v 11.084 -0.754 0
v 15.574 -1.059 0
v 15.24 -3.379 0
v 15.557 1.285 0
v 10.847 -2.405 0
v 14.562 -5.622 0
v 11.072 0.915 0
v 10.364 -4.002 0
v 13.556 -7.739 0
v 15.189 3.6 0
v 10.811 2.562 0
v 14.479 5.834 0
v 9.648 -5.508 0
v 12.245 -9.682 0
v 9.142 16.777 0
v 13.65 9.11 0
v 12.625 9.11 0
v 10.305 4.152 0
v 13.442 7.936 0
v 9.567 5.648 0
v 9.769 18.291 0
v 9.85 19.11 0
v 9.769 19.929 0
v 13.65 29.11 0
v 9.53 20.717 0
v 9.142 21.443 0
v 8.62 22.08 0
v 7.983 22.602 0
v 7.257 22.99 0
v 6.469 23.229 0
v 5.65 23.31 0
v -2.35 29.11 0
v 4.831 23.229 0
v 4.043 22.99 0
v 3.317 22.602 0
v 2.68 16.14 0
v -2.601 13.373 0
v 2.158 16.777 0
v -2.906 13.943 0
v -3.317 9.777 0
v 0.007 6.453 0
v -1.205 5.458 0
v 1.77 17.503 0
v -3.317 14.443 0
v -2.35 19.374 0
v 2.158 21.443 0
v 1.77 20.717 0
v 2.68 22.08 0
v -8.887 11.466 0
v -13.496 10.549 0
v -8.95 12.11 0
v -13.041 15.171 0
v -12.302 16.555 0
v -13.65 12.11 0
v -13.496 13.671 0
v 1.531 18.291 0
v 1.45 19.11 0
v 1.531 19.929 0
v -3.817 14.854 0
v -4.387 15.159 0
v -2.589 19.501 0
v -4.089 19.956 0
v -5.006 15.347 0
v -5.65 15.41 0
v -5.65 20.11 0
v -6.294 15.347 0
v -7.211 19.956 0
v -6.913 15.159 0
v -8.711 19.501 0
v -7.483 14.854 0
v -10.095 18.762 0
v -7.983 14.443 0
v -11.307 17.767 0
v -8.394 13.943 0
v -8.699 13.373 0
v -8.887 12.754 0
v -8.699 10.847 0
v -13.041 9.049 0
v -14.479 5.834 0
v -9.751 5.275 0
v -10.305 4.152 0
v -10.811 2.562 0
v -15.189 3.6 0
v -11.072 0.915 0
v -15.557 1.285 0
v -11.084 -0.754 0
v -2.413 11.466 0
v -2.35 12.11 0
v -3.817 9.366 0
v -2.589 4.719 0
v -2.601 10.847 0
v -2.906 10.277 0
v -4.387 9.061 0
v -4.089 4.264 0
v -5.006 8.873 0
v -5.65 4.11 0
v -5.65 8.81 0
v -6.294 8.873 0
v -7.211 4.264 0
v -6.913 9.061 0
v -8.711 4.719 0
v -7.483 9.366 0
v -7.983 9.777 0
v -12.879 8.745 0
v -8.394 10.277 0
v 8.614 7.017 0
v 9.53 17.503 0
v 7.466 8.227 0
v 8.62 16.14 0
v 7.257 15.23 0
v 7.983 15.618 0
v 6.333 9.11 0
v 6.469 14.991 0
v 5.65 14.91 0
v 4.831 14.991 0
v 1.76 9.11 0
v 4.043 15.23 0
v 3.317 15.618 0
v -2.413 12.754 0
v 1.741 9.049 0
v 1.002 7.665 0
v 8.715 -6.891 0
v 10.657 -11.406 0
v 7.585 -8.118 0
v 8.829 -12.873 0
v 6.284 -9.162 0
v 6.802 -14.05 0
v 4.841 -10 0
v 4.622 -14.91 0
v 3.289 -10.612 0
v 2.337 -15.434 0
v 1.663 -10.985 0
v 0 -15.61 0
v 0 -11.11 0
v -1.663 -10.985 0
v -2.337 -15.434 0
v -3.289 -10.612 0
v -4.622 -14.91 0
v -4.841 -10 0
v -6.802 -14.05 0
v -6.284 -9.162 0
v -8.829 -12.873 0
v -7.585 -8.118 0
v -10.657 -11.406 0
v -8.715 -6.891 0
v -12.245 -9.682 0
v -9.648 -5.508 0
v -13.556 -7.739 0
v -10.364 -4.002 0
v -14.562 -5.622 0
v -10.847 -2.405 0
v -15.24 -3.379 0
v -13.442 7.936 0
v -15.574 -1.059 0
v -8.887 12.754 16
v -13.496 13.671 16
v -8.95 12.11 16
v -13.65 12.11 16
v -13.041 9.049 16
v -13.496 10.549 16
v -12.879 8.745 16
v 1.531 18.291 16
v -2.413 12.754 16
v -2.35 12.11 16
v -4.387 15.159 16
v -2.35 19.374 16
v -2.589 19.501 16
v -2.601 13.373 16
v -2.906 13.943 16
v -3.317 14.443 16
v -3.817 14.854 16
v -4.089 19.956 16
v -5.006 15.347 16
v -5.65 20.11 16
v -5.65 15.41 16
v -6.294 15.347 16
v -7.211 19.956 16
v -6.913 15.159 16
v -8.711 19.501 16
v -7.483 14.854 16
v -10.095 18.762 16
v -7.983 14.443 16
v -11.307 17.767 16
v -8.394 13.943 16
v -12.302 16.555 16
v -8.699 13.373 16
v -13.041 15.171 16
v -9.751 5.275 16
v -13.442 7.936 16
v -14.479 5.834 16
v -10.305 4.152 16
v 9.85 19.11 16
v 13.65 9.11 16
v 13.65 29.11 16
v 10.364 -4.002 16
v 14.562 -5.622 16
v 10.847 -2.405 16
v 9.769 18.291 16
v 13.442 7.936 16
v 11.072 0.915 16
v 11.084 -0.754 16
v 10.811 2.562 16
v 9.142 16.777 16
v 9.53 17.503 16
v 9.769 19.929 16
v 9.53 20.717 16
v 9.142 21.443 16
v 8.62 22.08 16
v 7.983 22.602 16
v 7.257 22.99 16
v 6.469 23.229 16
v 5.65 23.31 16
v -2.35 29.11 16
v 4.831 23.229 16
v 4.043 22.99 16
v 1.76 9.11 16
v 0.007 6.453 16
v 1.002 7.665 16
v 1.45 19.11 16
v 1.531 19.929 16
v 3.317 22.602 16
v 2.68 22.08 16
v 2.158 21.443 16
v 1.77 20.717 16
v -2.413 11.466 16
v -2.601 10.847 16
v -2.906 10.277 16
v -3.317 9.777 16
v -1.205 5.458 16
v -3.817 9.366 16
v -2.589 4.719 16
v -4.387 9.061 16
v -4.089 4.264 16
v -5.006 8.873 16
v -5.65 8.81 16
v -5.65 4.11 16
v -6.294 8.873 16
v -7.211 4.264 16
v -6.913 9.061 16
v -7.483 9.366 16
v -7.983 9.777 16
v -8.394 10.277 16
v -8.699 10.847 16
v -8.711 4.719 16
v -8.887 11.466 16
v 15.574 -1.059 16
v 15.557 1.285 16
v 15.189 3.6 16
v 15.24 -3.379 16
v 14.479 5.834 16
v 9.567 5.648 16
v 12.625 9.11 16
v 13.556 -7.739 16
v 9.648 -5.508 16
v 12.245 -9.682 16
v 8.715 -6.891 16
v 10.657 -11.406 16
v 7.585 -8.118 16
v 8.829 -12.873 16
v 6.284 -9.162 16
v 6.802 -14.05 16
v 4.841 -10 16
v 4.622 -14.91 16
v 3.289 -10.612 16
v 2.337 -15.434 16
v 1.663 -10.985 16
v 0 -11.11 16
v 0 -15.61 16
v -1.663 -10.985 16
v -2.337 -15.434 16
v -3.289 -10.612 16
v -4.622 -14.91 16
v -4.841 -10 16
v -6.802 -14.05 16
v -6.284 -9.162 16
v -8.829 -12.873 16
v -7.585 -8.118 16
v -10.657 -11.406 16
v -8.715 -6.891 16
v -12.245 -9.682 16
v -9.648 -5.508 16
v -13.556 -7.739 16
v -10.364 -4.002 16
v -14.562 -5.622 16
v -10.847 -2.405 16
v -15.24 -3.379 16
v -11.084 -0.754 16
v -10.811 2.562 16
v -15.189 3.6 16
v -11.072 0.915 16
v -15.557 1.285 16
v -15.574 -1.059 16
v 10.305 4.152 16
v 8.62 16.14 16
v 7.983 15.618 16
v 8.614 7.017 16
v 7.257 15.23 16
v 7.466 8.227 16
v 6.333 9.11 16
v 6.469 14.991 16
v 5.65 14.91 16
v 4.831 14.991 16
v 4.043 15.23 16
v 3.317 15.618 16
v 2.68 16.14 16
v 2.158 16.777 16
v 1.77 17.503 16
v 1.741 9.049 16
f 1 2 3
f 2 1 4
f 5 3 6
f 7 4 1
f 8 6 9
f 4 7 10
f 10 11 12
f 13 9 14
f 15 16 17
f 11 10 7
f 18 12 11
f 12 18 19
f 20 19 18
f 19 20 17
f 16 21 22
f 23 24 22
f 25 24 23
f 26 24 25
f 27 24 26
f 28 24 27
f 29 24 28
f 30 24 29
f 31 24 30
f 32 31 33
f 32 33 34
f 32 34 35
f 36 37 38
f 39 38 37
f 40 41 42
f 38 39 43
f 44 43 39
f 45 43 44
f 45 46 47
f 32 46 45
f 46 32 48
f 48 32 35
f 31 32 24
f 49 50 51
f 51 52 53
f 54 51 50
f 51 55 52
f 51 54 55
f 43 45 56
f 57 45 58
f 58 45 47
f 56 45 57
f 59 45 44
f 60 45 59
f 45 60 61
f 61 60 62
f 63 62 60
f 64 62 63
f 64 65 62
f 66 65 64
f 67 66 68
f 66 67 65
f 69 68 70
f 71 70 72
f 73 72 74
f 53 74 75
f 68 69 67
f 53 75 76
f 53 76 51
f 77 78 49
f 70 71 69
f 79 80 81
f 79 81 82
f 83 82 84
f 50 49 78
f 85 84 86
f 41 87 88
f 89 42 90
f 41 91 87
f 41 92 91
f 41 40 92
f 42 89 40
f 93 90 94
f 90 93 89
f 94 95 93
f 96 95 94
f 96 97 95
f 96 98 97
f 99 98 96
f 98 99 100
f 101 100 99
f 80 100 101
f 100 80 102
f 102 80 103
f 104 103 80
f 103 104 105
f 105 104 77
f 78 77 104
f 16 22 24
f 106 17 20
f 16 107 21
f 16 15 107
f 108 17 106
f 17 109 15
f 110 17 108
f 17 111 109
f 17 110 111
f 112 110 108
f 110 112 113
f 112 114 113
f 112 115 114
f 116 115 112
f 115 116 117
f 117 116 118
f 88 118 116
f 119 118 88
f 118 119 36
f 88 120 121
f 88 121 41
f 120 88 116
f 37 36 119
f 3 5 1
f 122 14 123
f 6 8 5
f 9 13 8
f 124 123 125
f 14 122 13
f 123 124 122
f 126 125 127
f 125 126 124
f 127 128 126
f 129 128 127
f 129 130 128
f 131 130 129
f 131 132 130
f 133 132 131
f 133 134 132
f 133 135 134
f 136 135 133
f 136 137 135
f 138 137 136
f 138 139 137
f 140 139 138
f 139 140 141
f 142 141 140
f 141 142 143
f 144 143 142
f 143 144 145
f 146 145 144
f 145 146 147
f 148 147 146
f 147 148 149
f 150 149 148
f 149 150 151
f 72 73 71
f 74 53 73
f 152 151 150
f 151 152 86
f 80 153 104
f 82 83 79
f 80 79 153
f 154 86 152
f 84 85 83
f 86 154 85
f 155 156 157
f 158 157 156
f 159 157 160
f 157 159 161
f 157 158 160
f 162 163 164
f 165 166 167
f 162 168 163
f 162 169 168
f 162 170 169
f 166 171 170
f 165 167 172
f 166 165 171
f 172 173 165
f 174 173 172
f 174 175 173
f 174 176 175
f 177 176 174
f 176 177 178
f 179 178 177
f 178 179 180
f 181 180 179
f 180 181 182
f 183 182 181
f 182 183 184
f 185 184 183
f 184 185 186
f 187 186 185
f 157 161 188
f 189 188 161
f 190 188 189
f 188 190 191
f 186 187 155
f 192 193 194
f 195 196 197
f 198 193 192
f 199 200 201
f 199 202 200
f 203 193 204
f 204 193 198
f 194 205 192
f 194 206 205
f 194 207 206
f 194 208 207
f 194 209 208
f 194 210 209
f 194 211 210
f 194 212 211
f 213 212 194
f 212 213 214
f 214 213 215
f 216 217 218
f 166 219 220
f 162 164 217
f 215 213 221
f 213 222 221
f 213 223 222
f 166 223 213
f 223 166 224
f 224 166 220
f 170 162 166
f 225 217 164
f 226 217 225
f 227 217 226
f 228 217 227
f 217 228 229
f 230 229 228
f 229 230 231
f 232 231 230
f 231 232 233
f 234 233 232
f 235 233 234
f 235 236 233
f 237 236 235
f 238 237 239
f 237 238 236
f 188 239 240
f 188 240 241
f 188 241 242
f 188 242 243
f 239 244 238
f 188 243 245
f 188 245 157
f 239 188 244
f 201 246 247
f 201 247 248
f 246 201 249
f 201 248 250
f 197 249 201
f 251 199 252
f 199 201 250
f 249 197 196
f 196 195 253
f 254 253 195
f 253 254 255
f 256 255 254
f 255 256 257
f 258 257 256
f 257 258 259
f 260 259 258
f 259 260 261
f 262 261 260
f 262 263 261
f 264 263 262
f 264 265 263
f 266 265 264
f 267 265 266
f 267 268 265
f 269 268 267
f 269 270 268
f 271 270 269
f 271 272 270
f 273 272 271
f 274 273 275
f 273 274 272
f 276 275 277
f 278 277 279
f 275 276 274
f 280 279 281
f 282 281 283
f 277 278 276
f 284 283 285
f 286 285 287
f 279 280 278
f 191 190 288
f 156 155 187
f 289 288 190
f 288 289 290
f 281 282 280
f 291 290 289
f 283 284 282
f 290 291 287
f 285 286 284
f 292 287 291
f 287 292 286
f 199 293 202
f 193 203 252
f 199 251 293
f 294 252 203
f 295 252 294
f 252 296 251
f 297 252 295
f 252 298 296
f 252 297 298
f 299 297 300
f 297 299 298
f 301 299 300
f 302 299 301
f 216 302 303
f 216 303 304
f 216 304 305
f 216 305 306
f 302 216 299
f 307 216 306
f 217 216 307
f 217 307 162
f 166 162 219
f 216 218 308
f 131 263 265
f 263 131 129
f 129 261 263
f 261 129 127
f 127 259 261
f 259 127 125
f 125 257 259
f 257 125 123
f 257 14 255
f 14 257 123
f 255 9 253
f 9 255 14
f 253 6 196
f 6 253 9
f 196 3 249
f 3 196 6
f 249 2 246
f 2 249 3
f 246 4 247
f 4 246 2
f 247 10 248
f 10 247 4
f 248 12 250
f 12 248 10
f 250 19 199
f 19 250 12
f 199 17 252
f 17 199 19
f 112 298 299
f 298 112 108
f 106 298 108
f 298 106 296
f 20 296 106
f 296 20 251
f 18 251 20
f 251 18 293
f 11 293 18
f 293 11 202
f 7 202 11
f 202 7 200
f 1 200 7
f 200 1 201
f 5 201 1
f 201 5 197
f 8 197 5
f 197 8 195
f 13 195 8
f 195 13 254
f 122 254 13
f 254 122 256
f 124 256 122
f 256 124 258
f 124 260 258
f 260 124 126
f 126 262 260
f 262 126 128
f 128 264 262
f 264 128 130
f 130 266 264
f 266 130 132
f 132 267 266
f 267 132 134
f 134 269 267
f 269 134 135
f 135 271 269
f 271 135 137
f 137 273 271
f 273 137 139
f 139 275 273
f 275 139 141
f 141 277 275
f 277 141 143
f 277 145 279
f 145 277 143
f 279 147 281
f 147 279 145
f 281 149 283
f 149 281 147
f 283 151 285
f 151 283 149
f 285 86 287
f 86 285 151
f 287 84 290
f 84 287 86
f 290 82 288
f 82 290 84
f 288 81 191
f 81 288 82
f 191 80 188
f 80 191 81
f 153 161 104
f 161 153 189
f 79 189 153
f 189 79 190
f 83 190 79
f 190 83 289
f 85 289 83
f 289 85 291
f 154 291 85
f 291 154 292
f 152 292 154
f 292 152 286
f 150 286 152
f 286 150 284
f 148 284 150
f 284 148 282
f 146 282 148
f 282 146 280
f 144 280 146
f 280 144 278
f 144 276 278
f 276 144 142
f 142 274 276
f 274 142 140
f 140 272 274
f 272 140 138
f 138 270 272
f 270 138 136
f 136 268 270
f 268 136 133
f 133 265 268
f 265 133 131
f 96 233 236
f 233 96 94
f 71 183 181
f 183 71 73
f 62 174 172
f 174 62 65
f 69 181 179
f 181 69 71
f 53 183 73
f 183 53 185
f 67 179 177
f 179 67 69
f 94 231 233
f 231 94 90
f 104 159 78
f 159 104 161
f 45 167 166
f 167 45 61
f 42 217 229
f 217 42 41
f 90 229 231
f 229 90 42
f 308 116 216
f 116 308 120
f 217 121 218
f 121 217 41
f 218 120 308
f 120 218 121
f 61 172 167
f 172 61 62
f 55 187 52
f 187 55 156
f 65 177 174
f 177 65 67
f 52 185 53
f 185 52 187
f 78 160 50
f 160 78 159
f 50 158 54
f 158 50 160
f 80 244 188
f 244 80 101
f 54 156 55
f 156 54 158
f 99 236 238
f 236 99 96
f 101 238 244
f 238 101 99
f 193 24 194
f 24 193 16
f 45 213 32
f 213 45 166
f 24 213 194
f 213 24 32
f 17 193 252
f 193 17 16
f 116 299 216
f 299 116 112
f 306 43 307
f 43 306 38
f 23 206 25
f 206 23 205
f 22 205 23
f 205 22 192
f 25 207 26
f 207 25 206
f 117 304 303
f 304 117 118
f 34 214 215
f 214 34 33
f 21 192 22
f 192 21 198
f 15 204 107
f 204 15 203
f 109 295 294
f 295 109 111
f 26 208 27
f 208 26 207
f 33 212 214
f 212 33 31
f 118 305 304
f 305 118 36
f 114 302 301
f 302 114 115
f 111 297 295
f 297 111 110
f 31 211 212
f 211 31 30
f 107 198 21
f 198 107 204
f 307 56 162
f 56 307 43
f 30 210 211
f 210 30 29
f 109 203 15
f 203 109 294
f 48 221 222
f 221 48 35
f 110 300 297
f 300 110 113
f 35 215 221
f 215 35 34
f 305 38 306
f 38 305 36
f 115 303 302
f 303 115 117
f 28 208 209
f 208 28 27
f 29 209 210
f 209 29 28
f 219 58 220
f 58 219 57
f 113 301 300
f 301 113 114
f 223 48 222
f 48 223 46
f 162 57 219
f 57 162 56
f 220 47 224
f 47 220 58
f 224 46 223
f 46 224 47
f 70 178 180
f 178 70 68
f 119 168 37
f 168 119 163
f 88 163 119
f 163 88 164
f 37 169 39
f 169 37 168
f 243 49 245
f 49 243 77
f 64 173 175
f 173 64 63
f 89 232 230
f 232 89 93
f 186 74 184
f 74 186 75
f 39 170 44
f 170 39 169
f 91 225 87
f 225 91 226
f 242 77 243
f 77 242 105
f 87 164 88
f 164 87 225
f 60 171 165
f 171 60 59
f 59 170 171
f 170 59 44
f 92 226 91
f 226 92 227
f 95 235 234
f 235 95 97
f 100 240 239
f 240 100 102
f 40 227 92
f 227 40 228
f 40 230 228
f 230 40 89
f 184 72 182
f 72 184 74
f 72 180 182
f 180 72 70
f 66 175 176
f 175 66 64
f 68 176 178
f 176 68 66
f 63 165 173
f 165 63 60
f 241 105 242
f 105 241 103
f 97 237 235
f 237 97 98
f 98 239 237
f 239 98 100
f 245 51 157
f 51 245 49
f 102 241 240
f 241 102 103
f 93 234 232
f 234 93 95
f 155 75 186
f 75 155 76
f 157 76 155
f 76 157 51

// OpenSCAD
$fn = 32;

// ----------------------------------------------------------------------
// Pipe clamp: 31.22 mm ring, 4.5 mm wall, 16 mm wide
// ----------------------------------------------------------------------

// --- parameters (mm) ---
outer_r = 15.61;          // clamp outside radius
inner_r = 11.11;          // pipe bore radius
band = 4.5;               // band thickness
clamp_w = 16;             // clamp width
opening = 50;             // opening angle between the ends
lug_w = 16;               // lug width
lug_len = 20;             // lug length
bolt_d = 8.4;             // bolt hole
knuckle_d = 16;           // hinge knuckle diameter
pin_d = 6.6;              // hinge pin hole

clamp_profile = [[-6.597, 14.147], [-8.641, 13], [-10.49, 11.56], [-12.103, 9.859], [-13.442, 7.936], [-14.479, 5.834], [-15.189, 3.6], [-15.557, 1.285], [-15.574, -1.059], [-15.24, -3.379], [-14.562, -5.622], [-13.556, -7.739], [-12.245, -9.682], [-10.657, -11.406], [-8.829, -12.873], [-6.802, -14.05], [-4.622, -14.91], [-2.337, -15.434], [0, -15.61], [2.337, -15.434], [4.622, -14.91], [6.802, -14.05], [8.829, -12.873], [10.657, -11.406], [12.245, -9.682], [13.556, -7.739], [14.562, -5.622], [15.24, -3.379], [15.574, -1.059], [15.557, 1.285], [15.189, 3.6], [14.479, 5.834], [13.442, 7.936], [12.103, 9.859], [10.49, 11.56], [8.641, 13], [6.597, 14.147], [4.695, 10.069], [6.15, 9.253], [7.466, 8.227], [8.614, 7.017], [9.567, 5.648], [10.305, 4.152], [10.811, 2.562], [11.072, 0.915], [11.084, -0.754], [10.847, -2.405], [10.364, -4.002], [9.648, -5.508], [8.715, -6.891], [7.585, -8.118], [6.284, -9.162], [4.841, -10], [3.289, -10.612], [1.663, -10.985], [0, -11.11], [-1.663, -10.985], [-3.289, -10.612], [-4.841, -10], [-6.284, -9.162], [-7.585, -8.118], [-8.715, -6.891], [-9.648, -5.508], [-10.364, -4.002], [-10.847, -2.405], [-11.084, -0.754], [-11.072, 0.915], [-10.811, 2.562], [-10.305, 4.152], [-9.567, 5.648], [-8.614, 7.017], [-7.466, 8.227], [-6.15, 9.253], [-4.695, 10.069]];

difference() {
  union() {
    linear_extrude(height = clamp_w) polygon(clamp_profile);
    /* hinge knuckle, sunk 2 mm into the band end */
    translate([-5.65, 12.11, 0]) cylinder(h = clamp_w, d = knuckle_d);
    /* bolt lug on the other end */
    translate([-2.35, 9.11, 0]) cube([lug_w, 20, clamp_w]);
  }
  translate([5.65, 19.11, -2.5]) cylinder(h = clamp_w + 5, d = bolt_d);
  translate([-5.65, 12.11, -2.5]) cylinder(h = clamp_w + 5, d = pin_d);
}
